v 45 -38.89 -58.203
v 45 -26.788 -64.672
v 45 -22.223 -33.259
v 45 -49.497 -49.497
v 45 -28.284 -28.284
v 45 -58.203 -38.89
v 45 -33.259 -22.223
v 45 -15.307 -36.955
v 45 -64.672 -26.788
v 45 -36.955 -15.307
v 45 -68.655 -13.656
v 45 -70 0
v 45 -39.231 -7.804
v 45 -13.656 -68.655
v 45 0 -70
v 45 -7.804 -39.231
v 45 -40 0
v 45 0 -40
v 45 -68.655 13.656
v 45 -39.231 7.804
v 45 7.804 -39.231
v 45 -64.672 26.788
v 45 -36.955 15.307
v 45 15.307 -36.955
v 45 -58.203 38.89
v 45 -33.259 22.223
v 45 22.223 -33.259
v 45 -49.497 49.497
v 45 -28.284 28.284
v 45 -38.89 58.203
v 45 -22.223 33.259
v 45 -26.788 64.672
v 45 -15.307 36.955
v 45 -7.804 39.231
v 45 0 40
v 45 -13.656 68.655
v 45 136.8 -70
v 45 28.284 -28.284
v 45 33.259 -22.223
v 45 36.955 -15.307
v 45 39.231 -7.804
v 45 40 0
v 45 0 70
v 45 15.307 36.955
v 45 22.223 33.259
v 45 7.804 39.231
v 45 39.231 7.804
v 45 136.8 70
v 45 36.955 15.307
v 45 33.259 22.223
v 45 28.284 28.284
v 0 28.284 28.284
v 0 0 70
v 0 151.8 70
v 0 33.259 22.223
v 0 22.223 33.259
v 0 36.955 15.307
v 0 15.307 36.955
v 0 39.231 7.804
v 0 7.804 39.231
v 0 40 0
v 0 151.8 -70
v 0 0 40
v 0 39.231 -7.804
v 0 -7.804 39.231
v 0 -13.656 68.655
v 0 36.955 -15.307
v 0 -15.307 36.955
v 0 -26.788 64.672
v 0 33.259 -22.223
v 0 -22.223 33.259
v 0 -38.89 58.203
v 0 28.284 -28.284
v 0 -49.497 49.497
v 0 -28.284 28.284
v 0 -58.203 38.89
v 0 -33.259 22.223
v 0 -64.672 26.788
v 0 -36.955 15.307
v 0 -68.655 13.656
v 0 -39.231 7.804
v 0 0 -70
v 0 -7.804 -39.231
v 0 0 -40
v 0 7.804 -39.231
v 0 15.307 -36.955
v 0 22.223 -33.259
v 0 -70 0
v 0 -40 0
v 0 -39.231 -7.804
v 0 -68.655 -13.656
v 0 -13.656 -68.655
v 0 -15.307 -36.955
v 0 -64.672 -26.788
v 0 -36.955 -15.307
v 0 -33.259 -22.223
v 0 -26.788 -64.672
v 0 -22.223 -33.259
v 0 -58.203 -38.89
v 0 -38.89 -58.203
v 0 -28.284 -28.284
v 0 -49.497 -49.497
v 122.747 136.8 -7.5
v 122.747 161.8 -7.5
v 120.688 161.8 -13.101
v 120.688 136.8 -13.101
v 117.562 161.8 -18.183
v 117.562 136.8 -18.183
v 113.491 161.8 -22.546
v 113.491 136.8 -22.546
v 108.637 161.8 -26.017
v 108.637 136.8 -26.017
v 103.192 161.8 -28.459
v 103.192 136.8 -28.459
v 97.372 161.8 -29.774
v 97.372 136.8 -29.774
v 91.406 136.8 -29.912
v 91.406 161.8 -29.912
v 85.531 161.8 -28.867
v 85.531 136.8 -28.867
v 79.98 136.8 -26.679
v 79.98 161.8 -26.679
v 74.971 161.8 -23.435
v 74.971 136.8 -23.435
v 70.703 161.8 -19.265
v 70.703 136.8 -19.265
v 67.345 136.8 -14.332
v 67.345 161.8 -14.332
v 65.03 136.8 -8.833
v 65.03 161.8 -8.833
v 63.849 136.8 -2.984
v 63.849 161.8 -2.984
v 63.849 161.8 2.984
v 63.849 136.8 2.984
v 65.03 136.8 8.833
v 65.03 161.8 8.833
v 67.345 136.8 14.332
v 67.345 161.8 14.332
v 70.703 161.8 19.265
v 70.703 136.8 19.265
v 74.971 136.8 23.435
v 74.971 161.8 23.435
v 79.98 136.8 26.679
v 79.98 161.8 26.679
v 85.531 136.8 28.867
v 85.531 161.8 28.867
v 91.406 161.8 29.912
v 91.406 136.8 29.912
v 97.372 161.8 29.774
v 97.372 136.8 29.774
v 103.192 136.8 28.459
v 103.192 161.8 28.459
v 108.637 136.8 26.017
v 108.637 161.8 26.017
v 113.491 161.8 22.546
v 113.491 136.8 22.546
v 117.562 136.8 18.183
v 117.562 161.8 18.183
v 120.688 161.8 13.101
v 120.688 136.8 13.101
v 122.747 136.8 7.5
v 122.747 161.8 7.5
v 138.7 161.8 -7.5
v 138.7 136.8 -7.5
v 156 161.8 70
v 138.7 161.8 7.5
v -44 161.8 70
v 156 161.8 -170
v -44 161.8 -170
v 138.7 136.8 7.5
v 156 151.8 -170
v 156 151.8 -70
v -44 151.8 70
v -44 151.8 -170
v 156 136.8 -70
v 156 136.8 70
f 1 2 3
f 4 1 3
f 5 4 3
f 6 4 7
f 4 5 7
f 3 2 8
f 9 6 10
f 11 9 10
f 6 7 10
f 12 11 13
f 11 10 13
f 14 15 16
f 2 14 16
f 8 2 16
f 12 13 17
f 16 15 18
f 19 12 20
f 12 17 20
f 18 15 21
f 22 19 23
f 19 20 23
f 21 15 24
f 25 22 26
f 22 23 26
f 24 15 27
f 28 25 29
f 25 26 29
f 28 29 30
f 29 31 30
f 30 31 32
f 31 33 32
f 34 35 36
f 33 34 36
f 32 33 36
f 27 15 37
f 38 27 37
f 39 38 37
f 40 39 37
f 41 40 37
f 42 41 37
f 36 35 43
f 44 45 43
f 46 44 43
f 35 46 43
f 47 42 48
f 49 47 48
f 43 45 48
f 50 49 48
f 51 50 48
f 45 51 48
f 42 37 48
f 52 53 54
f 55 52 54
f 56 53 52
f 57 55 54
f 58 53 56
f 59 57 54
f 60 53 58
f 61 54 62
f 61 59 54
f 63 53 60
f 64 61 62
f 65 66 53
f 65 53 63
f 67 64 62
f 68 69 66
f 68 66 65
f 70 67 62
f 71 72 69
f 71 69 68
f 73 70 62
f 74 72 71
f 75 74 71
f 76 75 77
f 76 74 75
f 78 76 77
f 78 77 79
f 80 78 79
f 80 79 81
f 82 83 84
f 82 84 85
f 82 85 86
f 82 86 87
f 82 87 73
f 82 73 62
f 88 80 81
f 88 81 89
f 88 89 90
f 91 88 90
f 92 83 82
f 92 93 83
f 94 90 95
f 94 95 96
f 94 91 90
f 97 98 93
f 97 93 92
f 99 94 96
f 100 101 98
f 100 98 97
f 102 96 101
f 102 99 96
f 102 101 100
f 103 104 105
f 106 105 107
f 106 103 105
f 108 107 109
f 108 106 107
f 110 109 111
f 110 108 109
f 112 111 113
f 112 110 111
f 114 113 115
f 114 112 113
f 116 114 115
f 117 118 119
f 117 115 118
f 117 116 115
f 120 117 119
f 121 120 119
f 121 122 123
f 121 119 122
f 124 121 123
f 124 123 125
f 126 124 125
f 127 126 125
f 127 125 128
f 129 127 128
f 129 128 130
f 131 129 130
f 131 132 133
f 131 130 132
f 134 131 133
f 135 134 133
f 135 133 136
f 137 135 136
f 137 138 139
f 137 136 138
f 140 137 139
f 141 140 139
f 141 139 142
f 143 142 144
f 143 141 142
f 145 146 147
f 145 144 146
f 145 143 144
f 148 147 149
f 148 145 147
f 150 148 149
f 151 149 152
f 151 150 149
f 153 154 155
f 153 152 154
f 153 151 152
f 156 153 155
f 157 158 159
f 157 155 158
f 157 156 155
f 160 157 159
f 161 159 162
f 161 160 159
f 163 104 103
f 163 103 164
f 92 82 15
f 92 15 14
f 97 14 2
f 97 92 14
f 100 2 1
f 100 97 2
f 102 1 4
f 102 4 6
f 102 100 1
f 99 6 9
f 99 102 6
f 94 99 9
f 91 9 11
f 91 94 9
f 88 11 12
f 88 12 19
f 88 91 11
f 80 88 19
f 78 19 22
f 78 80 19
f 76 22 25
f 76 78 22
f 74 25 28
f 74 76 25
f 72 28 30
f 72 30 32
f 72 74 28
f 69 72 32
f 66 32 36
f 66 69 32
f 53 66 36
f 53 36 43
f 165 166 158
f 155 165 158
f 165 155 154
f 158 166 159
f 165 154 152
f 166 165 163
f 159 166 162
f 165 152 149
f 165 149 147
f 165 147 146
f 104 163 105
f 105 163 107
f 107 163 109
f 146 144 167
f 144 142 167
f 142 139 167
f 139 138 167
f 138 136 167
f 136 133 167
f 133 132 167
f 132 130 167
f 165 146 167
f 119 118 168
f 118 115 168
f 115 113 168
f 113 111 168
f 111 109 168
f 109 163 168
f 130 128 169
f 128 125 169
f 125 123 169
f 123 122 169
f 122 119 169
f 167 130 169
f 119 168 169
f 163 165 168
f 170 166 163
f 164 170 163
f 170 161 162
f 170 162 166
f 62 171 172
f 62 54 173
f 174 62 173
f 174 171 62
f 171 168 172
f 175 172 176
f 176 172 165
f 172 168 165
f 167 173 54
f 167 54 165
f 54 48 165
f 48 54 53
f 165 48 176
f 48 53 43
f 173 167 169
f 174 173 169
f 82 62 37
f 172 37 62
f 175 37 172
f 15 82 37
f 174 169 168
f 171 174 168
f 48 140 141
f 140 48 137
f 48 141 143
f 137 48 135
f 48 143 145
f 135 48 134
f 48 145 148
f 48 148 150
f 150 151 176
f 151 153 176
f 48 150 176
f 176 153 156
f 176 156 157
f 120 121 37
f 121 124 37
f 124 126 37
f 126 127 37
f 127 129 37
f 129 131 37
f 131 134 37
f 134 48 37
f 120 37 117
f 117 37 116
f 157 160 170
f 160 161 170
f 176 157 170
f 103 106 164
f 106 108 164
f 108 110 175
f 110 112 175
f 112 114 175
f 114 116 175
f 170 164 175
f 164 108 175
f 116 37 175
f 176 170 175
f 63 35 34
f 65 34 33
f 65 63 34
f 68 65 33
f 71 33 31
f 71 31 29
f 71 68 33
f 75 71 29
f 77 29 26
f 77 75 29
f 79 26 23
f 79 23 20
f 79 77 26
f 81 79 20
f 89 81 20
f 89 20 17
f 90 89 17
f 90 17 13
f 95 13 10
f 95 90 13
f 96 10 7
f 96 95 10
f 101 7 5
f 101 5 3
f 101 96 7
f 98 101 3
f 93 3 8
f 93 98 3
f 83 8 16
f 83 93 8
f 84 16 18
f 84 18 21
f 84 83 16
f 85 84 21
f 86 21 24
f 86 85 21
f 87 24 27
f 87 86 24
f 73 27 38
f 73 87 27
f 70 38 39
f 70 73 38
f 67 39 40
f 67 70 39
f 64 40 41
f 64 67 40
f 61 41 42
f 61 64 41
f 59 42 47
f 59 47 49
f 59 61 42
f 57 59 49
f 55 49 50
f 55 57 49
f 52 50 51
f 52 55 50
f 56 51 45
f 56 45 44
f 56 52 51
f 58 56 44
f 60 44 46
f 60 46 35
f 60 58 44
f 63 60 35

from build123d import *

# Parameters (mm, degrees)
SCHIZZO1_R                   = 40
ESTRUSIONE_ESTRUSIONE1_DEPTH = 45
SCHIZZO2_W                   = 156
SCHIZZO2_H                   = 140
SCHIZZO2_R                   = 30
ESTRUSIONE_ESTRUSIONE2_DEPTH = 25
ESTRUSIONE_ESTRUSIONE4_DEPTH = 10
SCHIZZO6_W                   = 45
SCHIZZO6_H                   = 15
TAGLIO_ESTRUSIONE1_DEPTH     = 25


with BuildPart() as part:
    # Schizzo1 → Estrusione-Estrusione1 (new body)
    with BuildSketch(Plane(origin=(0, 0, 0), x_dir=(0, 0, -1), z_dir=(1, 0, 0))):
        with BuildLine():
            Line((-70, 0), (-70, 136.8))
            Line((-70, 136.8), (70, 136.8))
            Line((70, 136.8), (70, 0))
            ThreePointArc((70, 0), (0, -70), (-70, 0))
        make_face()
        with Locations(Location((0, 0, 0), (0, 0, 180))):
            Circle(SCHIZZO1_R, mode=Mode.SUBTRACT)
    extrude(amount=ESTRUSIONE_ESTRUSIONE1_DEPTH)

    # Schizzo2 → Estrusione-Estrusione2 (add)
    with BuildSketch(Plane(origin=(0, 136.8, 0), x_dir=(1, 0, 0), z_dir=(0, 1, 0))):
        with Locations((78, 0)):
            Rectangle(SCHIZZO2_W, SCHIZZO2_H)
        with Locations(Location((93.7, 0, 0), (0, 0, 270))):
            Circle(SCHIZZO2_R, mode=Mode.SUBTRACT)
    extrude(amount=ESTRUSIONE_ESTRUSIONE2_DEPTH)

    # Schizzo5 → Estrusione-Estrusione4 (add)
    with BuildSketch(Plane(origin=(0, 161.8, 0), x_dir=(1, 0, 0), z_dir=(0, 1, 0))):
        Polygon((156, 170), (156, 70), (0, 70), (0, -70), (-44, -70), (-44, 170), align=None)
    extrude(amount=-ESTRUSIONE_ESTRUSIONE4_DEPTH)

    # Schizzo6 → Taglio-Estrusione1 (cut)
    with BuildSketch(Plane(origin=(0, 161.8, 0), x_dir=(1, 0, 0), z_dir=(0, 1, 0))):
        with Locations((116.2, 0)):
            Rectangle(SCHIZZO6_W, SCHIZZO6_H)
    extrude(amount=-TAGLIO_ESTRUSIONE1_DEPTH, mode=Mode.SUBTRACT)


solid = part.part
